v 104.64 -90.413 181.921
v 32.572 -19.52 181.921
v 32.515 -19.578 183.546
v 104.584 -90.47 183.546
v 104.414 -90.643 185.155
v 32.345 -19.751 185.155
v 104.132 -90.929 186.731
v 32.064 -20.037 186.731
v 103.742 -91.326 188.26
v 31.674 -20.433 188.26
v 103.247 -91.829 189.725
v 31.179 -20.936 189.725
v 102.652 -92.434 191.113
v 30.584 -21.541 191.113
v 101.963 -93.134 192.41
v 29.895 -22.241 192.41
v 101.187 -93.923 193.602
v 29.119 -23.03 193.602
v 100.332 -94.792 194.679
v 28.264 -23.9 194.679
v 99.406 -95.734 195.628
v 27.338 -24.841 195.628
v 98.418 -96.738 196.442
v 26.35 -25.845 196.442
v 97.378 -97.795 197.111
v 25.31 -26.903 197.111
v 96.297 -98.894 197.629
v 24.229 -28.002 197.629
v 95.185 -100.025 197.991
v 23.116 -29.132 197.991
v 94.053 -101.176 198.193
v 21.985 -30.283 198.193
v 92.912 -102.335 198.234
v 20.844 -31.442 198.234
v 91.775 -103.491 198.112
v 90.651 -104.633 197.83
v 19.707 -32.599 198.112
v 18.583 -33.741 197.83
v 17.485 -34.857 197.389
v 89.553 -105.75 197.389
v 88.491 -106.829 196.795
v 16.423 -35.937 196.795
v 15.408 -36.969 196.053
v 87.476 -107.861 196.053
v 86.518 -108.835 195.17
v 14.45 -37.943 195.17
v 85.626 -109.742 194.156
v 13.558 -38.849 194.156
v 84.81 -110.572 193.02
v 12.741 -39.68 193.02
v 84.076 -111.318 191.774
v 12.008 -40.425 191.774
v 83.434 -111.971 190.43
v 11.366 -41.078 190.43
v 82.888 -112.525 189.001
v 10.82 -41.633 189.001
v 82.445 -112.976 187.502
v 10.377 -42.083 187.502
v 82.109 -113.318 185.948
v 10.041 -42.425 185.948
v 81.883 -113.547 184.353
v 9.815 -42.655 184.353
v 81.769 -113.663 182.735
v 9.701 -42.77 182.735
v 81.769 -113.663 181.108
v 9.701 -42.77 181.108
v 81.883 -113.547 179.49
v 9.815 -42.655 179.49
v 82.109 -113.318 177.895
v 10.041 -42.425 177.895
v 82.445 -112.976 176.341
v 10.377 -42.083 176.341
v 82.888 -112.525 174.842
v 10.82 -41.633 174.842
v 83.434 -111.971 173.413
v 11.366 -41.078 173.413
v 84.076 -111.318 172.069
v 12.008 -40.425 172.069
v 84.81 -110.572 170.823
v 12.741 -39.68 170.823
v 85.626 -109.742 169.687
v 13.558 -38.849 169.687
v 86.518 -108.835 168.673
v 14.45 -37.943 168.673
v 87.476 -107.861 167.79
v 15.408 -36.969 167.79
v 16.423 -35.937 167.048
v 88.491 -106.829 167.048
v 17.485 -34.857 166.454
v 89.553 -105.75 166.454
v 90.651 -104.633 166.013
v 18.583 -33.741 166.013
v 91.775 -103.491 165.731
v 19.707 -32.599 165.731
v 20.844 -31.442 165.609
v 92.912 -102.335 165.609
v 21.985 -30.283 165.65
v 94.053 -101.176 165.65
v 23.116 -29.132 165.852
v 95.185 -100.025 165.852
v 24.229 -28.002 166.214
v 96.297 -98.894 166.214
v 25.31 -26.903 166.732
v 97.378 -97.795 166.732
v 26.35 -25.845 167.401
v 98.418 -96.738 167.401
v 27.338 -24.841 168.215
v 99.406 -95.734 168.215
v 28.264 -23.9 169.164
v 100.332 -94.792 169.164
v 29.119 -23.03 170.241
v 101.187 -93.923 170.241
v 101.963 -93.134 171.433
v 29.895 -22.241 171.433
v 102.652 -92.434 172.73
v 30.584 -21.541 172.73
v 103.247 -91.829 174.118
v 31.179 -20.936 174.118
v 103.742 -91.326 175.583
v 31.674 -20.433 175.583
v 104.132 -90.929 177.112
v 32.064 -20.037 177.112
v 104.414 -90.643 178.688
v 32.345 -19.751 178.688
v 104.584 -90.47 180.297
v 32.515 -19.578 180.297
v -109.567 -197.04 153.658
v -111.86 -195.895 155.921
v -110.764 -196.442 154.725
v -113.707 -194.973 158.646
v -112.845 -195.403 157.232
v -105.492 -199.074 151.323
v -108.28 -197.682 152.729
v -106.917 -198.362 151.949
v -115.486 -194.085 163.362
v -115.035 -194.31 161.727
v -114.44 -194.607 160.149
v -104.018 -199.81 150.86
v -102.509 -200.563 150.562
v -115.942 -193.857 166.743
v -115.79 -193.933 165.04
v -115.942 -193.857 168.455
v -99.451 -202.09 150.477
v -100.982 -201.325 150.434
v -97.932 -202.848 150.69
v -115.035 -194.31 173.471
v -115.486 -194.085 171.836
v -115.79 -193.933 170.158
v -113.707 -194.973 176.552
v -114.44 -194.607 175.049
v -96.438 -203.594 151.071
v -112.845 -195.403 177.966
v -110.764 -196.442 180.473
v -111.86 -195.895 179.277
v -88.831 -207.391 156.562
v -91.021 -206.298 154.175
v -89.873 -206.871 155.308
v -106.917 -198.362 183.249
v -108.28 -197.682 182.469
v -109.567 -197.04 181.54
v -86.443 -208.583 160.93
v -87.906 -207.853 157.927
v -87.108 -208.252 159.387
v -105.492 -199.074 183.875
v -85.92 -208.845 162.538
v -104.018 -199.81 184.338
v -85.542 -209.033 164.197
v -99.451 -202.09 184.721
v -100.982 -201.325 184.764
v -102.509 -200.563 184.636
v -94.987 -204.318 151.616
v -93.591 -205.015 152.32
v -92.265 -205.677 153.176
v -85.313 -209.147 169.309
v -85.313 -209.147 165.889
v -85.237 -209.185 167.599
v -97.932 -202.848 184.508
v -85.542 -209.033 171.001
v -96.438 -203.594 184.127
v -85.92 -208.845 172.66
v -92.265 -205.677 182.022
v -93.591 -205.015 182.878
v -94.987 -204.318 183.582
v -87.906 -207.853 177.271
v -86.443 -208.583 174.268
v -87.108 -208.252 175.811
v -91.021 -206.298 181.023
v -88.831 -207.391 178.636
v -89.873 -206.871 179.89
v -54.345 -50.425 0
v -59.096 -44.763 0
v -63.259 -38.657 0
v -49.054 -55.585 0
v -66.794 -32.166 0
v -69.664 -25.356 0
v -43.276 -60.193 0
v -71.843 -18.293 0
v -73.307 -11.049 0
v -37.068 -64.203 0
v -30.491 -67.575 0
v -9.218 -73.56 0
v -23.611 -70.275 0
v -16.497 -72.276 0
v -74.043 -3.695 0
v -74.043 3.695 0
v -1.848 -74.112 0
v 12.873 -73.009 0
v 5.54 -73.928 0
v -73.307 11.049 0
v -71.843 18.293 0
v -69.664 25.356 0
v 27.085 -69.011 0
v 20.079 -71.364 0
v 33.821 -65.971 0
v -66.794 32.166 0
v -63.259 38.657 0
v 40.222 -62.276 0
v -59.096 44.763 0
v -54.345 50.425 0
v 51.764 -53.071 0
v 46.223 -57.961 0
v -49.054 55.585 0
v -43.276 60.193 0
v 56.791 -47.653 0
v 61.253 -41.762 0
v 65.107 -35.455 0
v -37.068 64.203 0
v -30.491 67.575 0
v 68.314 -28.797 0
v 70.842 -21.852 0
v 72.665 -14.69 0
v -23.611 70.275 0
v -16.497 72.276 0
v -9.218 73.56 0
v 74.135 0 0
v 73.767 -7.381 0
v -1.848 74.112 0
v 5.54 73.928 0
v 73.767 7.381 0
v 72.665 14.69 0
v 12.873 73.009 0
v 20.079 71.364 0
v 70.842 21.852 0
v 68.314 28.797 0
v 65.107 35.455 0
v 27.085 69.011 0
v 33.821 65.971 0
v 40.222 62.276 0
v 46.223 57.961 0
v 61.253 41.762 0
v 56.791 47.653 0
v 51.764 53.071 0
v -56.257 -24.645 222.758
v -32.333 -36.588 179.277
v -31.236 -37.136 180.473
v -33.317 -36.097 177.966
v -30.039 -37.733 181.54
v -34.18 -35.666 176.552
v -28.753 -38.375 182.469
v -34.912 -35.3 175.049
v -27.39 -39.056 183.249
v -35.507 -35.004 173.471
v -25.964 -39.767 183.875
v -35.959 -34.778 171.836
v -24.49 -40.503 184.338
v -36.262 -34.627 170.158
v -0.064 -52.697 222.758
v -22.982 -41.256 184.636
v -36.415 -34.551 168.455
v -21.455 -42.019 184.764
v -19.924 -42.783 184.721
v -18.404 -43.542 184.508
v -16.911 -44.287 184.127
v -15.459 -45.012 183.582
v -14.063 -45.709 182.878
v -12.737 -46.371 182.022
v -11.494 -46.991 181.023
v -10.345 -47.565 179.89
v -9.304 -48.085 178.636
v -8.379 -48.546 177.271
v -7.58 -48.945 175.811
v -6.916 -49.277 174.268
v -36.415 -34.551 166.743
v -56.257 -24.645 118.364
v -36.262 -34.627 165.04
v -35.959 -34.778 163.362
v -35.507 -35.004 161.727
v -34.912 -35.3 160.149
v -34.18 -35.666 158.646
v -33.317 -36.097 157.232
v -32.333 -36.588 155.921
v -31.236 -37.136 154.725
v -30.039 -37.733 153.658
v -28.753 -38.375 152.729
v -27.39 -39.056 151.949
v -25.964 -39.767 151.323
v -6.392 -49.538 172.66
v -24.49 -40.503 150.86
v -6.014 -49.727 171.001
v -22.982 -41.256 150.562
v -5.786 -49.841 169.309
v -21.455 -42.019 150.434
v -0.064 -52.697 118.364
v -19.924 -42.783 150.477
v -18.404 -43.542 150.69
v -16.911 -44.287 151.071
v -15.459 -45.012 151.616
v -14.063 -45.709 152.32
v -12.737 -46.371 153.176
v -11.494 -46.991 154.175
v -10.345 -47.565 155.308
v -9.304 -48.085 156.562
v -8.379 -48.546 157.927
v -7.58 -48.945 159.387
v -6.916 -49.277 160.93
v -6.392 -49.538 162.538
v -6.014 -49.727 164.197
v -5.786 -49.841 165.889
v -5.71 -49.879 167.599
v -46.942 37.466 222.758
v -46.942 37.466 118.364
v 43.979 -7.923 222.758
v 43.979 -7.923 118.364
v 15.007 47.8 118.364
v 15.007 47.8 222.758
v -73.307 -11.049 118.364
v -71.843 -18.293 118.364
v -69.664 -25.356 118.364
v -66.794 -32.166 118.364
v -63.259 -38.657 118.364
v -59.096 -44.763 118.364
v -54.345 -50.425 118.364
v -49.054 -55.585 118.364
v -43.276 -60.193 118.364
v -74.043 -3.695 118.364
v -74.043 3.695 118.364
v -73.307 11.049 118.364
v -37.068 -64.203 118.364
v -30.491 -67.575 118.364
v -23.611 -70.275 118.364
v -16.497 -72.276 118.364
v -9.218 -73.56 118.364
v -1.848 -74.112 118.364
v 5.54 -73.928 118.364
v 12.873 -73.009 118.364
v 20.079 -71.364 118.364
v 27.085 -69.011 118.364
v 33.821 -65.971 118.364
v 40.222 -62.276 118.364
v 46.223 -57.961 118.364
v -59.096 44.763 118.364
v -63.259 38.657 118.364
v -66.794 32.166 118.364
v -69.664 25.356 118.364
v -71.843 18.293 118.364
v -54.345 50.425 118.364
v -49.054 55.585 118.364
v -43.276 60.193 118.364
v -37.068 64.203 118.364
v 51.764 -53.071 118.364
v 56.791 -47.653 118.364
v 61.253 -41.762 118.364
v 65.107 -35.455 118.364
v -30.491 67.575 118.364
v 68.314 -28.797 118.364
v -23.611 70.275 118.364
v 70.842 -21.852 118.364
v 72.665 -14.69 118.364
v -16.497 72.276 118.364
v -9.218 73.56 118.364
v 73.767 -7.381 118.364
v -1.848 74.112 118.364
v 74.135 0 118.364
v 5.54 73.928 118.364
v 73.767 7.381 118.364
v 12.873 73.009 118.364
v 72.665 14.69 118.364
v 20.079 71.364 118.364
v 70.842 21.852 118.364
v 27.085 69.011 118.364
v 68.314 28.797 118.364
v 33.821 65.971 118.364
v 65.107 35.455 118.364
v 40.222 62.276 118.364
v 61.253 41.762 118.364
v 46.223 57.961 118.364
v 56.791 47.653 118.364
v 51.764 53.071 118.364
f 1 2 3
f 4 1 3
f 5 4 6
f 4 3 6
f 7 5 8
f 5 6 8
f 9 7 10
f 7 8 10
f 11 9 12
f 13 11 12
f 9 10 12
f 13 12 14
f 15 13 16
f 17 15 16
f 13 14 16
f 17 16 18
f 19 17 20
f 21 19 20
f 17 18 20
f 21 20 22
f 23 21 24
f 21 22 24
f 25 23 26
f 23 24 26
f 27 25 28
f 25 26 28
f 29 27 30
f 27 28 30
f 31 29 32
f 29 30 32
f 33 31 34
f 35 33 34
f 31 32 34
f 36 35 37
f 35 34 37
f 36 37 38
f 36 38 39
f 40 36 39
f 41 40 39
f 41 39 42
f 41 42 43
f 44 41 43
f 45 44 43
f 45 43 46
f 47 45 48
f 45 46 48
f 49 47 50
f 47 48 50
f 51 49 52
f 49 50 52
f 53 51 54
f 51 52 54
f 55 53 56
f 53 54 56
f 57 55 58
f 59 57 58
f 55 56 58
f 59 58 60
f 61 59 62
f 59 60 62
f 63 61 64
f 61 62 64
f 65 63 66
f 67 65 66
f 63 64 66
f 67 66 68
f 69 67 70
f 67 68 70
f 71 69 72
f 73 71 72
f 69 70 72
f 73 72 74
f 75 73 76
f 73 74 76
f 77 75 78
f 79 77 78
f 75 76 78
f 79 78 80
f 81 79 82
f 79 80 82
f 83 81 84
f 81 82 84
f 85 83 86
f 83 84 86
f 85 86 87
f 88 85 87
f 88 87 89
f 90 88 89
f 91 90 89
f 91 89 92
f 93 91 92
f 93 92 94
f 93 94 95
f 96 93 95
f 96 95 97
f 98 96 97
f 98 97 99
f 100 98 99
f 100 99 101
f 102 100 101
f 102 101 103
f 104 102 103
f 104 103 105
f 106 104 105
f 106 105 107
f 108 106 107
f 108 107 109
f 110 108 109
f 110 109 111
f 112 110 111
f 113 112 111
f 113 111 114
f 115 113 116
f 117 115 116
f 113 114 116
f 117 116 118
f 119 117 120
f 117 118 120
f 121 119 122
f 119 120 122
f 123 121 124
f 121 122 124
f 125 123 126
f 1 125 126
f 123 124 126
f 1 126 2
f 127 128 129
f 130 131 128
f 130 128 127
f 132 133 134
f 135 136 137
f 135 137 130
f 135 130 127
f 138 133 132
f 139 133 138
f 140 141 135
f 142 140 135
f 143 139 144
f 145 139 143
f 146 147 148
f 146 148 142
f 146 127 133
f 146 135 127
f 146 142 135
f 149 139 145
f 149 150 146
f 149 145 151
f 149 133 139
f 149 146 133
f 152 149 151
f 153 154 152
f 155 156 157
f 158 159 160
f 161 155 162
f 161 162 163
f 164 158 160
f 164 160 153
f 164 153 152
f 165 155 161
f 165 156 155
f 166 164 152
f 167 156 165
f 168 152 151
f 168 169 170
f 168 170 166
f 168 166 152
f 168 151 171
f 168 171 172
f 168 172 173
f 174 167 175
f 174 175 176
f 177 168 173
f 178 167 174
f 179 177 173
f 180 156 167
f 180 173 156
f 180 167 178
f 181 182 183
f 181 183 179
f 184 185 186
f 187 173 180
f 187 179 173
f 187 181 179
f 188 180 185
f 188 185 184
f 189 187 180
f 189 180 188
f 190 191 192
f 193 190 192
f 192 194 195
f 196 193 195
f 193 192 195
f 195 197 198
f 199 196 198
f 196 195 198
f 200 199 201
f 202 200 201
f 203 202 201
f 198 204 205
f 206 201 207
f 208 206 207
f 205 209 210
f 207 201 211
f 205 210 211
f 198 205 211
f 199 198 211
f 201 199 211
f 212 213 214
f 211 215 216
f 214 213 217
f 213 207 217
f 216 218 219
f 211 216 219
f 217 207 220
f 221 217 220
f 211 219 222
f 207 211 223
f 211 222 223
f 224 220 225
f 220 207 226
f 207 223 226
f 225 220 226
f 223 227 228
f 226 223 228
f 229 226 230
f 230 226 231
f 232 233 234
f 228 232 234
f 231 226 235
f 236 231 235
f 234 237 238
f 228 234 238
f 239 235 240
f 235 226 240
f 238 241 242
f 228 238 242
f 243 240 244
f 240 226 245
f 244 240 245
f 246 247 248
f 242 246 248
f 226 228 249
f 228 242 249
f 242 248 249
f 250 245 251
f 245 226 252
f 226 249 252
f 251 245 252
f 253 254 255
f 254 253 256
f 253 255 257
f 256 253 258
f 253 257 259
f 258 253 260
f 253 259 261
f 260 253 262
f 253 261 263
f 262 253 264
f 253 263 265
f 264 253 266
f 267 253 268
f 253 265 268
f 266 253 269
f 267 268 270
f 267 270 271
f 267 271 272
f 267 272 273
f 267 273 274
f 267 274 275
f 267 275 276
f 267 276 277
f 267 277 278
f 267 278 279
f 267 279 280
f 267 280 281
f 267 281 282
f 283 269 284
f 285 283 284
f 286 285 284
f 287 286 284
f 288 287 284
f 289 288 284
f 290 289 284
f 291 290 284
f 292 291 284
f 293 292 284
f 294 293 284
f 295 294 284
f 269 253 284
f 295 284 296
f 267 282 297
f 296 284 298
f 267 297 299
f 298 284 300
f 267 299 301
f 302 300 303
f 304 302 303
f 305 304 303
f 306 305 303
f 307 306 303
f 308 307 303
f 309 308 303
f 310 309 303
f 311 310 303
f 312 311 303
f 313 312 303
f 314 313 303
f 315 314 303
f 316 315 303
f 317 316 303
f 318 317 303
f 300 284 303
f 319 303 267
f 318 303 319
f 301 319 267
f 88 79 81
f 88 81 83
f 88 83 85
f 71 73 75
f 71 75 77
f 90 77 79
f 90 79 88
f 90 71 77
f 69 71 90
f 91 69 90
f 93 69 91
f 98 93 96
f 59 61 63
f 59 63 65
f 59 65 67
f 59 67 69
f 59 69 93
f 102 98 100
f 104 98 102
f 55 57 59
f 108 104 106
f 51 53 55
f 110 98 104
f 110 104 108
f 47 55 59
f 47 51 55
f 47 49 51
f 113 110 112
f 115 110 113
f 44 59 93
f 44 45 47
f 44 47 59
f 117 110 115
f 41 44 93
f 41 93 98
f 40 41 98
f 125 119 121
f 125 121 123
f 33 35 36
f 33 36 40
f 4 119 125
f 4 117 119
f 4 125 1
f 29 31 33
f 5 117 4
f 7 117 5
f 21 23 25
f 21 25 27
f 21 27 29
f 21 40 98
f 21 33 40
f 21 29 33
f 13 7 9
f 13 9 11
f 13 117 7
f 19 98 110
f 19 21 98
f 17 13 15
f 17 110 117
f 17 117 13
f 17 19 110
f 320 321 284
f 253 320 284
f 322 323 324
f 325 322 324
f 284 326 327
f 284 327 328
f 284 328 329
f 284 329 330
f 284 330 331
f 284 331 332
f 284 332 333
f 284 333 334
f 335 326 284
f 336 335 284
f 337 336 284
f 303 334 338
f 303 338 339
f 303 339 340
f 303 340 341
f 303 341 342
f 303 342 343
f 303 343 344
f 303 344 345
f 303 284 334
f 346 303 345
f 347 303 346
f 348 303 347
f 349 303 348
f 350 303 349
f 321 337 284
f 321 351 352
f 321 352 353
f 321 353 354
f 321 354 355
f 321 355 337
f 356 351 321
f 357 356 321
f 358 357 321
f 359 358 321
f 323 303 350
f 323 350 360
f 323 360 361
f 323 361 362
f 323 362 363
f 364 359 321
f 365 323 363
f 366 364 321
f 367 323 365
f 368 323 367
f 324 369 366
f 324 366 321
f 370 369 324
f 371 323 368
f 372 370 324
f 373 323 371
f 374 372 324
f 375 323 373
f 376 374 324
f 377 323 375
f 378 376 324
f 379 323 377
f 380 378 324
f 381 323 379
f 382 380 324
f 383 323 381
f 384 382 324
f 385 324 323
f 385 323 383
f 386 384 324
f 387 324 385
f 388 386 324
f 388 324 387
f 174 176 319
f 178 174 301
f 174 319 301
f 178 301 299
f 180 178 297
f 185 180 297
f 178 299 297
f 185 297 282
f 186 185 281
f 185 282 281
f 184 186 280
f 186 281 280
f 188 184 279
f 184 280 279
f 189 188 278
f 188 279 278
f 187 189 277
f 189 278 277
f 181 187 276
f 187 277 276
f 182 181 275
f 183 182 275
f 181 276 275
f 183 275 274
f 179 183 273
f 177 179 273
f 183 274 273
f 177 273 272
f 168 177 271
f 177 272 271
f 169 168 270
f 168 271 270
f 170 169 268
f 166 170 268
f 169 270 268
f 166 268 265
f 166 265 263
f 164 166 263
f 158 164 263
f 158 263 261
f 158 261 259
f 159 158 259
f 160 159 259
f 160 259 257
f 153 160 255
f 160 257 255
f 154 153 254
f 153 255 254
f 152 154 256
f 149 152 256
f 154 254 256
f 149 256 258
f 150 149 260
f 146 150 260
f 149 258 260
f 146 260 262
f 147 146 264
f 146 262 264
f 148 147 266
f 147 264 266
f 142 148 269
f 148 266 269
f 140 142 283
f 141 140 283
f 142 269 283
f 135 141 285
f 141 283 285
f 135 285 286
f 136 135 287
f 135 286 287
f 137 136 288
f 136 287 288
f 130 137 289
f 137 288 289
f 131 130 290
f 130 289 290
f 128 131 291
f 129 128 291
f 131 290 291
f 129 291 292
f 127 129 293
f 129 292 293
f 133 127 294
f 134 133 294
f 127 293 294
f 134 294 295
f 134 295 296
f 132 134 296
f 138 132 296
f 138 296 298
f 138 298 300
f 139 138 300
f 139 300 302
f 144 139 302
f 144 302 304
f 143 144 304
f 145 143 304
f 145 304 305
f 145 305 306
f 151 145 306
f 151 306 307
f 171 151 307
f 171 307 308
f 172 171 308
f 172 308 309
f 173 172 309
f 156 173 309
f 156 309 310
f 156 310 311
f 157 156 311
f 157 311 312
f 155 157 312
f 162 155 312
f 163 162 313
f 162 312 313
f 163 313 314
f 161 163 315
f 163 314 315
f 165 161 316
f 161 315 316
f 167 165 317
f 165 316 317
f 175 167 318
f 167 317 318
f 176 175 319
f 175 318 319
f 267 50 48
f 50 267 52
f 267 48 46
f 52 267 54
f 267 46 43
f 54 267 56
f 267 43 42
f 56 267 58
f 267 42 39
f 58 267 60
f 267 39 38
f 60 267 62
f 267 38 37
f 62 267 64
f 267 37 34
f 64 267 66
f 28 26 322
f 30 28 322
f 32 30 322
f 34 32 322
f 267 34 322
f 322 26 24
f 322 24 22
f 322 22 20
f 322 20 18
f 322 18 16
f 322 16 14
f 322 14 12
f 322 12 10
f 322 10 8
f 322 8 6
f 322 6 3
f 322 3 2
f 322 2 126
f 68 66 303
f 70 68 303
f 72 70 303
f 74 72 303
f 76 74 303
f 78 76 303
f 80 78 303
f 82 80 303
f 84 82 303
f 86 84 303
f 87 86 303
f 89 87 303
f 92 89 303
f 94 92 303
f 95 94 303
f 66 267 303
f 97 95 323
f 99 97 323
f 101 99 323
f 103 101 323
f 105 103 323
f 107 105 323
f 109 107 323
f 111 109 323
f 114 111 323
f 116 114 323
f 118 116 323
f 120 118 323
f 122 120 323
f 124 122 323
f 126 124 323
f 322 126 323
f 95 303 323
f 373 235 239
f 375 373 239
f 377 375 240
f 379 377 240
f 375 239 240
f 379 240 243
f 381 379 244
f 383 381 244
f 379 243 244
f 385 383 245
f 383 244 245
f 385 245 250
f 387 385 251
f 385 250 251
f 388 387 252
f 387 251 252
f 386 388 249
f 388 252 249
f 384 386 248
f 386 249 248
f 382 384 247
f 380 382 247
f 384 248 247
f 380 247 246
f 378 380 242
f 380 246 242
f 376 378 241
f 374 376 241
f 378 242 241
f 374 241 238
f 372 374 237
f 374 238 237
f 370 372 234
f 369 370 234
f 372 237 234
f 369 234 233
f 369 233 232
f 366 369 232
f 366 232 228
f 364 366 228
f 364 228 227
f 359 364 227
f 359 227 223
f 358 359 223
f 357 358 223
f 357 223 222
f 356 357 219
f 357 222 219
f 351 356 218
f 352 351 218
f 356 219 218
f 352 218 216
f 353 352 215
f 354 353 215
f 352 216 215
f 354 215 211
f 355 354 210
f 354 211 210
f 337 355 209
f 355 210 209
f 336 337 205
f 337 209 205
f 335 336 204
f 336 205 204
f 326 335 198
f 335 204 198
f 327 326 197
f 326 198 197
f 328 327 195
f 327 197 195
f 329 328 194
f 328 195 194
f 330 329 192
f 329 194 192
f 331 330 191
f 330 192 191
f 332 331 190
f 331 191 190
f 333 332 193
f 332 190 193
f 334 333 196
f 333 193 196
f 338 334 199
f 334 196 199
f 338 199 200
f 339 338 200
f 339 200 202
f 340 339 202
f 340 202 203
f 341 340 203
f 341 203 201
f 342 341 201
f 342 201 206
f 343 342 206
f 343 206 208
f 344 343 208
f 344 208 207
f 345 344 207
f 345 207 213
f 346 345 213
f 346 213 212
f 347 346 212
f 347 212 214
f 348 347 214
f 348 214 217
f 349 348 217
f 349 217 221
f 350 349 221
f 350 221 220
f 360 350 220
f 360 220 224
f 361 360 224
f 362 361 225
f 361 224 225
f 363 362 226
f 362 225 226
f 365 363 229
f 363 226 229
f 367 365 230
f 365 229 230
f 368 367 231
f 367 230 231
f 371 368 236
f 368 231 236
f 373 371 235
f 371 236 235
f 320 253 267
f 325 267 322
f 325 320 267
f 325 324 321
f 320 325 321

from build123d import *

# Parameters (mm, degrees)
F0_R     = 74.1352209334
F1_DEPTH = 118.364
F3_DEPTH = 104.394
F4_R     = 16.3171471284
F5_DEPTH = 101.092
F6_R     = 17.1698744157
F7_DEPTH = 178.054


with BuildPart() as f1:
    # F0 (on Top) → F1 (new body)
    with BuildSketch(Plane.XY):
        Circle(F0_R)
    extrude(amount=F1_DEPTH)

    # F2 (on face) → F3 (join)
    with BuildSketch(Plane.XY.offset(118.364)):
        Polygon((-0.0639286038, -52.6971781414), (43.9794872102, -7.9233831007), (15.0072416542, 47.8002580793), (-46.9420066437, 37.4655672647), (-56.2565021134, -24.645264102), align=None)
    extrude(amount=F3_DEPTH)

    # F4 (on face) → F5 (join)
    with BuildSketch(Plane(origin=(26.312535727, -25.8833085534, 0), x_dir=(0.7012682501, 0.7128974971, 0), z_dir=(0.7128974971, -0.7012682501, 0))):
        with Locations((-7.3910155334, 181.9214969873)):
            Circle(F4_R)
    extrude(amount=F5_DEPTH)

    # F6 (on face) → F7 (join)
    with BuildSketch(Plane(origin=(-21.0716275073, -42.2099175124, 0), x_dir=(0.894709617, -0.4466482971, 0), z_dir=(-0.4466482971, -0.894709617, 0))):
        with Locations((0, 167.5989925861)):
            Circle(F6_R)
    extrude(amount=F7_DEPTH)


solid = f1.part
